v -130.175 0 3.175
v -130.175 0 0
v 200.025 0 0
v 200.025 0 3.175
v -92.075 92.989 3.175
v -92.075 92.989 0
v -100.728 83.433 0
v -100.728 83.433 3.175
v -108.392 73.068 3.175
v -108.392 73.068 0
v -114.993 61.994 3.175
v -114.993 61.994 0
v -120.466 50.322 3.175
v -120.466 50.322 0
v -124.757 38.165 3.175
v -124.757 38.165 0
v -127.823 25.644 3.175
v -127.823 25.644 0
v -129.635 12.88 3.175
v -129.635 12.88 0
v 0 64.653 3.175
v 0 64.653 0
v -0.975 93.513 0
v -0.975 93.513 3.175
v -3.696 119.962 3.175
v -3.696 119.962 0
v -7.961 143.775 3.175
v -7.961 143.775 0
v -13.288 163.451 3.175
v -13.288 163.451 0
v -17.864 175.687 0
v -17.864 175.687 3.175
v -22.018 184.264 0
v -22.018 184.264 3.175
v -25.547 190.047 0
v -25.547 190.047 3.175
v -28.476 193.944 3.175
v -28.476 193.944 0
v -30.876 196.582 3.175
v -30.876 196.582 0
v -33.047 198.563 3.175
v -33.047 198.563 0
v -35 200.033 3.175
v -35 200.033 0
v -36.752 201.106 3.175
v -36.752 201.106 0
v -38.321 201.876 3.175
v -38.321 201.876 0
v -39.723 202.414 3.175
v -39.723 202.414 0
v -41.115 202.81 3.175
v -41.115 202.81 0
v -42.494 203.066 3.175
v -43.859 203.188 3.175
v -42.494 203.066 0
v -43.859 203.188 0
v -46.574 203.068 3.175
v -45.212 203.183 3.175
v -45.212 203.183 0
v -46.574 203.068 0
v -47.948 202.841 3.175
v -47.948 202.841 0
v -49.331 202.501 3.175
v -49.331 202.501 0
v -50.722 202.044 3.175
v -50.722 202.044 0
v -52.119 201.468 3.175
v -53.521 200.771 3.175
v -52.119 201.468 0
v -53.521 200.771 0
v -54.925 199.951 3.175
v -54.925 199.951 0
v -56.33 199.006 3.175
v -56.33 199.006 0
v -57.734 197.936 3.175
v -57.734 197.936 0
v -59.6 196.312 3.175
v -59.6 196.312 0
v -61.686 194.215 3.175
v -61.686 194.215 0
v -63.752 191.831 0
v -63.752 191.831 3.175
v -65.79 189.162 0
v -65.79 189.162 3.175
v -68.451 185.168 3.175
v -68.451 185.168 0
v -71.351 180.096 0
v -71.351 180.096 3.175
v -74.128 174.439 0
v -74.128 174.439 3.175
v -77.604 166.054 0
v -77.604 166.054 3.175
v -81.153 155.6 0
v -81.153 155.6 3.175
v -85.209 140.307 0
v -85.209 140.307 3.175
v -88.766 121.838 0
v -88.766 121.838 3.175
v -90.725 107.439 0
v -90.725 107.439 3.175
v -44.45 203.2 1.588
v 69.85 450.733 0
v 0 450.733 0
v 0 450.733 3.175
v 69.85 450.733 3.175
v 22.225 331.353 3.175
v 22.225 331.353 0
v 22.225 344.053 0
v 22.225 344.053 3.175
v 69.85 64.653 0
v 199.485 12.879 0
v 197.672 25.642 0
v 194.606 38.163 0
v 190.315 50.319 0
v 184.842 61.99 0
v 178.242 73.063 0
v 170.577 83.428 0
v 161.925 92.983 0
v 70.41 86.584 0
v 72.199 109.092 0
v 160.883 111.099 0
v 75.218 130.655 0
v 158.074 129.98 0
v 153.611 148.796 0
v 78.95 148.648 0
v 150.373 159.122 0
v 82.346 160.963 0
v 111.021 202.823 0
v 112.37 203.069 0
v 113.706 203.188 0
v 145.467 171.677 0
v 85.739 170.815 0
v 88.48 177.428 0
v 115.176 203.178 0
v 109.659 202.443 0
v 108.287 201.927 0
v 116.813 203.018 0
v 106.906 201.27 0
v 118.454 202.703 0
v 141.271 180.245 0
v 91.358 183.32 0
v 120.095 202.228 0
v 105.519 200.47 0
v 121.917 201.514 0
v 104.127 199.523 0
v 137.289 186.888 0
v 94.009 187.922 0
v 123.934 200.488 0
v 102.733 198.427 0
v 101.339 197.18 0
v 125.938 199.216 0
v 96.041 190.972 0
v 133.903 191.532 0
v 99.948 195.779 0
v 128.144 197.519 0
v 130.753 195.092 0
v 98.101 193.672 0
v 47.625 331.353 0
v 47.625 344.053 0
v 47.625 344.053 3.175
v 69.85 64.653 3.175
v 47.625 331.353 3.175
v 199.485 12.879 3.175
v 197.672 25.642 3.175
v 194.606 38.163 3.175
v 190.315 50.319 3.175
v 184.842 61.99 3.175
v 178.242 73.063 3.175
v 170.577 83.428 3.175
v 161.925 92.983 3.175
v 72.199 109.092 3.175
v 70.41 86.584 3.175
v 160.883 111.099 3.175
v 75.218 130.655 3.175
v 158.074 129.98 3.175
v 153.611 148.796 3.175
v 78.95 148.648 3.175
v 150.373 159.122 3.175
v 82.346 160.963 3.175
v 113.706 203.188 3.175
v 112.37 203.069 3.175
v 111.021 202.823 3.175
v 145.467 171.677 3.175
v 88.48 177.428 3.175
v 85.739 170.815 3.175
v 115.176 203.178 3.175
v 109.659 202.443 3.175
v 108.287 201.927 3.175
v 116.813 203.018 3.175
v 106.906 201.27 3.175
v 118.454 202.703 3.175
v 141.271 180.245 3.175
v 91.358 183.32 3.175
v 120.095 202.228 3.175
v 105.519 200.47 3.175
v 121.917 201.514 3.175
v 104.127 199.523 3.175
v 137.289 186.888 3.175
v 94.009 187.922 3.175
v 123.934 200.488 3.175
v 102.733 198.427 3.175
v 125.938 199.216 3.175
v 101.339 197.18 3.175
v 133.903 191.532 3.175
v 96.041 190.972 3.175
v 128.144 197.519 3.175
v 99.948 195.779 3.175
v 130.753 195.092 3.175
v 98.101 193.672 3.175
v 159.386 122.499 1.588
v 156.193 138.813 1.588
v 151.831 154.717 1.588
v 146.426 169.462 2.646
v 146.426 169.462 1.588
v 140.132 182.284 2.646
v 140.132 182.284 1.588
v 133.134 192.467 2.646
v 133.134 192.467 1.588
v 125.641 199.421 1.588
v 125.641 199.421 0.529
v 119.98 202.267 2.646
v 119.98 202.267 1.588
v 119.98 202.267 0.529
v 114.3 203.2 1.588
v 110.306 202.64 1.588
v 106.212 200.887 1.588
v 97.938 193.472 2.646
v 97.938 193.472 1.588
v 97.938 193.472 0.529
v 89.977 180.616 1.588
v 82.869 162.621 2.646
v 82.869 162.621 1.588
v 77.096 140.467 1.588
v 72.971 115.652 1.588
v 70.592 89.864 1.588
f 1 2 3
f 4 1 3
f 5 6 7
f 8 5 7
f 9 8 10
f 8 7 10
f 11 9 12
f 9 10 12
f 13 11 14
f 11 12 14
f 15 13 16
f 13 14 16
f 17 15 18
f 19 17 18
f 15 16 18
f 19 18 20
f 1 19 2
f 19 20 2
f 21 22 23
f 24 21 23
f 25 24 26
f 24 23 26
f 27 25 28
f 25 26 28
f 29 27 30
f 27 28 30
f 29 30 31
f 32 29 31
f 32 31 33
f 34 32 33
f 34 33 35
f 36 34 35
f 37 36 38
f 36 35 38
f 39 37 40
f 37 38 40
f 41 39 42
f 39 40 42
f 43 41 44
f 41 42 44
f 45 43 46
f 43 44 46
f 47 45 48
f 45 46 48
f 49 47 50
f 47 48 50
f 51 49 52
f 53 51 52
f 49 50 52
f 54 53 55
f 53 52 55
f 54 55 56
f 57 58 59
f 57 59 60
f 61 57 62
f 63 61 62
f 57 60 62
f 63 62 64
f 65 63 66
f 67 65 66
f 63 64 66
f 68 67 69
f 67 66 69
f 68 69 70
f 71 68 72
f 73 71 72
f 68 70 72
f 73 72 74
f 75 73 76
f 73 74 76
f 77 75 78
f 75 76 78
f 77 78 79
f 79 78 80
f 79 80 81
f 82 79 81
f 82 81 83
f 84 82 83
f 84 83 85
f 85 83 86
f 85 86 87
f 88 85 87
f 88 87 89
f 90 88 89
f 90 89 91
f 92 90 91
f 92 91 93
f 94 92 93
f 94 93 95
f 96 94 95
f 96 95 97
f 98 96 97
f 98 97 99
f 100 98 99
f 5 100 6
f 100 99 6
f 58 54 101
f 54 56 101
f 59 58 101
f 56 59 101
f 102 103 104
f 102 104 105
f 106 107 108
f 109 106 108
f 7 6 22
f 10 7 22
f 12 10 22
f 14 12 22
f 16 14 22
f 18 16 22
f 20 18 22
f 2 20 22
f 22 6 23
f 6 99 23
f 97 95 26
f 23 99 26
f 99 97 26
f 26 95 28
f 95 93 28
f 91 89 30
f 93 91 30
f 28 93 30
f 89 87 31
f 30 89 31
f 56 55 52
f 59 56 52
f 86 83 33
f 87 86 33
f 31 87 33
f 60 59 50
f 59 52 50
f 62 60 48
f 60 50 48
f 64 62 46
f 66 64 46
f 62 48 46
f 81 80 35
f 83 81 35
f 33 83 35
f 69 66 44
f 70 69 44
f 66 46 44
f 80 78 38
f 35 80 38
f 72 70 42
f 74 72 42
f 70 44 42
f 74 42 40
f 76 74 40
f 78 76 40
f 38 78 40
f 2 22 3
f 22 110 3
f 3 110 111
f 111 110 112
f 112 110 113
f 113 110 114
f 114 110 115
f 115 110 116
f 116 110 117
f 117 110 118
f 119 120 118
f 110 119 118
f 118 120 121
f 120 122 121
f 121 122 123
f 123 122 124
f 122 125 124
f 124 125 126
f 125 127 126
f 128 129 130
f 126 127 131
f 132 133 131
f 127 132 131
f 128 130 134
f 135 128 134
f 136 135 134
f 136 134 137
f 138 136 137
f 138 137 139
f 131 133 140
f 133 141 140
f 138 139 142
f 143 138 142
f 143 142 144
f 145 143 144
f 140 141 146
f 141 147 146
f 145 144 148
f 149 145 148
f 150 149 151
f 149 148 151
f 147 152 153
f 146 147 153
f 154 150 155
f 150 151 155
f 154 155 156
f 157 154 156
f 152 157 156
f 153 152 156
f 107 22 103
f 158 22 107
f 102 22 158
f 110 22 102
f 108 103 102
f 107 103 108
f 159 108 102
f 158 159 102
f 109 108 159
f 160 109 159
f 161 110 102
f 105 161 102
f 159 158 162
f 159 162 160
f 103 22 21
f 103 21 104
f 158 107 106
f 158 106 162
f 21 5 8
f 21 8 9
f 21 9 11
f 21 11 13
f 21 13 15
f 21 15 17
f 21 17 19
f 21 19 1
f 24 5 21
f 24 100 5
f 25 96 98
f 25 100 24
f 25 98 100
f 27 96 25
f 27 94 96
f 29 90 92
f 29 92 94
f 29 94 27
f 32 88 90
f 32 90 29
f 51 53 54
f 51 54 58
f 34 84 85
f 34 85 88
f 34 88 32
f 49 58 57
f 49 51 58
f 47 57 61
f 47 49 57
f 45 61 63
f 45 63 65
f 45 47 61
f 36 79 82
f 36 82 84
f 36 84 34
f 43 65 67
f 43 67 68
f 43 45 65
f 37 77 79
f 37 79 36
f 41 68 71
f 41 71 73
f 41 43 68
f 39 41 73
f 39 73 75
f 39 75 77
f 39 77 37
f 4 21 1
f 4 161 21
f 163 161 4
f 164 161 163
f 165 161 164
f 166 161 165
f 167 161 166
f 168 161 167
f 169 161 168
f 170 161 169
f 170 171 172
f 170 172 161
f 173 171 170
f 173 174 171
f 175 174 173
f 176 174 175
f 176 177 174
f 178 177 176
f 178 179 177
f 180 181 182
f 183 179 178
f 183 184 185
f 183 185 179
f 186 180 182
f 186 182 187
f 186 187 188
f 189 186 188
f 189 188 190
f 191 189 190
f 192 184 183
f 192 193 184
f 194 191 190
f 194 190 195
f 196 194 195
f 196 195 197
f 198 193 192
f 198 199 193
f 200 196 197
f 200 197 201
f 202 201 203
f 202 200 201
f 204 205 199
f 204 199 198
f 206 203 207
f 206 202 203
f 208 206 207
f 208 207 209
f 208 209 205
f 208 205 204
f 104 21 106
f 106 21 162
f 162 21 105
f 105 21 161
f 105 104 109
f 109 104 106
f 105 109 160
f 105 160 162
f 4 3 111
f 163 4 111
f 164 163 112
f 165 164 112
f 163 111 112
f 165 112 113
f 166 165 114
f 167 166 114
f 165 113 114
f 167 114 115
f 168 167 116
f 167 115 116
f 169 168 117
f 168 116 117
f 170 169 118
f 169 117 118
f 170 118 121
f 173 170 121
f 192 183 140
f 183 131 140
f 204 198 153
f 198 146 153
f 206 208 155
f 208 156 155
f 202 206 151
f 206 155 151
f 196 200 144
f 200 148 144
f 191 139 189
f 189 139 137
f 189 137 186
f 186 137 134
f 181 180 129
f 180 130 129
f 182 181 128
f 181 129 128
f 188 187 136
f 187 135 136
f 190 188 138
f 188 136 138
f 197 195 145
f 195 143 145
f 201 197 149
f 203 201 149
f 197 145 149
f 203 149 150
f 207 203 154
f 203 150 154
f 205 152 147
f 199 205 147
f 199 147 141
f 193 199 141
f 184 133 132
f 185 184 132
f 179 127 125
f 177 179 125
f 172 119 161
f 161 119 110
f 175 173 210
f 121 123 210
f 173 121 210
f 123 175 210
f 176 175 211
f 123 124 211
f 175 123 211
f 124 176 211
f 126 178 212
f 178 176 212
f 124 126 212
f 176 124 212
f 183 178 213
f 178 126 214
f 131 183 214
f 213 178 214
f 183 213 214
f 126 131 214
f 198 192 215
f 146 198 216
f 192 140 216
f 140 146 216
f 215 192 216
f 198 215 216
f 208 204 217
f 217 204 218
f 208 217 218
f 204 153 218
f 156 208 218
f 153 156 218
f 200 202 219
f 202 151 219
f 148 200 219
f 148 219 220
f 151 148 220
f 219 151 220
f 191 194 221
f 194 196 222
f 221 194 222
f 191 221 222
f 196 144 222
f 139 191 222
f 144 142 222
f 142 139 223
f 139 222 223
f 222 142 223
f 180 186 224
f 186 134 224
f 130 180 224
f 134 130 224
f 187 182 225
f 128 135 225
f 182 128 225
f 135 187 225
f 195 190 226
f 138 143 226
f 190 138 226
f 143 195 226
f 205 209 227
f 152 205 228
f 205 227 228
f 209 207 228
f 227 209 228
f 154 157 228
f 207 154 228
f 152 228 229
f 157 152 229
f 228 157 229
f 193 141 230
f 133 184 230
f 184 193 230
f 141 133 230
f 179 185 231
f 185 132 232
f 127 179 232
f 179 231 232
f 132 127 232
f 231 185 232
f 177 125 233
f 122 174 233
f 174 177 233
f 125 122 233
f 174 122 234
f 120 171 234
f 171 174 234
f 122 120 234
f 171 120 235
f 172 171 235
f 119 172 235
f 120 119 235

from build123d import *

# Parameters (mm, degrees)
F0_W     = 69.85
F0_H     = 386.08
F0_W_2   = 25.4
F0_H_2   = 12.7
F0_H_3   = 64.6534590532
F1_DEPTH = 3.175


# Not quite as in the source:
# - the dataset's text gives a spline's control points without its knots; the knots are read off the source's solid


with BuildPart() as f1:
    # F0 (on Top) → F1 (new body)
    with BuildSketch(Plane.XY):
        with Locations((34.925, 257.6934590532)):
            Rectangle(F0_W, F0_H)
        with Locations((34.925, 337.7034590532)):
            Rectangle(F0_W_2, F0_H_2, mode=Mode.SUBTRACT)
        with BuildLine():
            Line((0, 0), (0, 64.6534590532))
            add(Edge.make_bspline(
                [(0, 64.6534590532), (0, 203.2), (-44.45, 203.2)],
                knots=[4.7123889804, 4.7123889804, 4.7123889804, 6.2831853072, 6.2831853072, 6.2831853072], degree=2, weights=[1, 0.7071067812, 1]))
            add(Edge.make_bspline(
                [(-44.45, 203.2), (-83.9884760445, 203.2), (-92.075, 92.9894)],
                knots=[0, 0, 0, 1.3648200427, 1.3648200427, 1.3648200427], degree=2, weights=[1, 0.7760550574, 1]))
            ThreePointArc((-92.075, 92.9894), (-120.4661612059, 50.3219990464), (-130.175, 0))
            Line((-130.175, 0), (0, 0))
        make_face()
        with Locations((34.925, 32.3267295266)):
            Rectangle(F0_W, F0_H_3)
        with BuildLine():
            add(Edge.make_bspline(
                [(114.3, 203.2), (116.5605862503, 203.2), (121.9530728583, 202.3331388879), (130.4947147155, 197.5987791483), (141.4933741705, 183.4269013443), (152.7385562531, 156.2534255189), (158.9074917941, 129.7692462355), (161.3044412153, 110.6229696373), (161.8811367628, 98.626656943), (161.925, 92.9830765781)],
                knots=[0.5267526841, 0.5267526841, 0.5267526841, 0.5267526841, 0.5267526841, 0.5267526841, 0.6, 0.7, 0.8, 0.9, 0.9934494331, 0.9934494331, 0.9934494331, 0.9934494331, 0.9934494331, 0.9934494331], degree=5))
            add(Edge.make_bspline(
                [(114.3, 203.2), (69.85, 203.2), (69.85, 64.6534590532)],
                knots=[0, 0, 0, 1.5707963268, 1.5707963268, 1.5707963268], degree=2, weights=[1, 0.7071067812, 1]))
            Line((69.85, 64.6534590532), (69.85, 0))
            Line((69.85, 0), (200.025, 0))
            ThreePointArc((200.025, 0), (190.3149490033, 50.3186009129), (161.925, 92.9830765781))
        make_face()
    extrude(amount=F1_DEPTH)


solid = f1.part
